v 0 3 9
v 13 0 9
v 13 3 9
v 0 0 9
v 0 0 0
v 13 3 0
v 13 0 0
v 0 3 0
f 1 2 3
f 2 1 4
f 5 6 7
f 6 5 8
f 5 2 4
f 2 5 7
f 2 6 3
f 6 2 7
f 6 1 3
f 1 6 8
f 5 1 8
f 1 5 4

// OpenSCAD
// Generated by SolidPython 1.0.1 on 2020-07-29 00:46:55


cube(size = [13, 3, 9]);
/***********************************************
*********      SolidPython code:      **********
************************************************
 
# import packages: SolidPython
from solid import *
from solid.utils import *
from itertools import chain, combinations, permutations


class Resize:

    def __init__(self, scad_file):
        self.scad_file = scad_file
        #self.scad_file = import_scad(scad_file)
        # cone/cylinder param:
        self.r1 = 0
        self.r2 = 0
        self.h = 0
        # rectangular prism param:
        self.w = 0
        self.l = 0
        # ellipse param:
        self.r = 0

    # import OpenScad code (file name corresponds to shape)


    # classify shape + parameters
    def assign(self, param1, param2, param3):
        if self.scad_file == 'cone.scad':
            self.r1 = param1
            self.r2 = param2
            self.h = param3
        elif self.scad_file == 'cylinder.scad':
            self.r1 = param1
            self.r2 = param2
            self.h = param3
        elif self.scad_file == 'rectangularPrism.scad':
            self.h = param1
            self.l = param2
            self.w = param3
        else:
            self.r = param1
            self.h = param2

    # resize parameters
    def iterate(self):
        x = range(3, 20, 2)
        i = 1
        if self.scad_file == 'cone.scad':
            tempList = list(permutations(x, 2))
            for temp in tempList:
                param1 = temp[0]
                param2 = temp[1]
                filepath = 'produced_scad_files/' + 'cone' + str(param1) + '_' + str(param2) + '_' + '.scad'
                scad_render_to_file(cylinder(h=param1, r1=param2, r2=0), filepath)

        elif self.scad_file == 'cylinder.scad':
            tempList = list(permutations(x, 3))
            for temp in tempList:
                param1 = temp[0]
                param2 = temp[1]
                filepath = 'produced_scad_files/' + 'cylinder' + str(param1) + '_' + str(param2) + '_' + '.scad'
                scad_render_to_file(cylinder(h=param1, r1=param2, r2=param2), filepath)

        elif self.scad_file == 'rectangularPrism.scad':
            tempList = list(permutations(x, 3))
            for temp in tempList:
                param1 = temp[0]
                param2 = temp[1]
                param3 = temp[2]
                filepath = 'produced_scad_files/' + 'rectangularPrism' + str(param1) + '_' + str(param2) + '_' + str(
                    param3) + '.scad'
                scad_render_to_file(cube(size=(param1, param2, param3)), filepath)

        elif self.scad_file == 'ellipse.scad':
            tempList = list(permutations(x, 4))
            for temp in tempList:
                param1 = temp[0]
                param2 = temp[1]
                param3 = temp[2]
                param4 = temp[3]
                filepath = 'produced_scad_files/' + 'ellipse' + str(param1) + '_' + str(param2) + '_' + str(param3) + '_' + str(param4) + '.scad'
                scad_render_to_file(scale([param1, param2, param3])(sphere(r=param4)), filepath)

    def render_to_scadfile(self):
        scad_render_to_file(scad, 'example.scad') 
 
************************************************/
